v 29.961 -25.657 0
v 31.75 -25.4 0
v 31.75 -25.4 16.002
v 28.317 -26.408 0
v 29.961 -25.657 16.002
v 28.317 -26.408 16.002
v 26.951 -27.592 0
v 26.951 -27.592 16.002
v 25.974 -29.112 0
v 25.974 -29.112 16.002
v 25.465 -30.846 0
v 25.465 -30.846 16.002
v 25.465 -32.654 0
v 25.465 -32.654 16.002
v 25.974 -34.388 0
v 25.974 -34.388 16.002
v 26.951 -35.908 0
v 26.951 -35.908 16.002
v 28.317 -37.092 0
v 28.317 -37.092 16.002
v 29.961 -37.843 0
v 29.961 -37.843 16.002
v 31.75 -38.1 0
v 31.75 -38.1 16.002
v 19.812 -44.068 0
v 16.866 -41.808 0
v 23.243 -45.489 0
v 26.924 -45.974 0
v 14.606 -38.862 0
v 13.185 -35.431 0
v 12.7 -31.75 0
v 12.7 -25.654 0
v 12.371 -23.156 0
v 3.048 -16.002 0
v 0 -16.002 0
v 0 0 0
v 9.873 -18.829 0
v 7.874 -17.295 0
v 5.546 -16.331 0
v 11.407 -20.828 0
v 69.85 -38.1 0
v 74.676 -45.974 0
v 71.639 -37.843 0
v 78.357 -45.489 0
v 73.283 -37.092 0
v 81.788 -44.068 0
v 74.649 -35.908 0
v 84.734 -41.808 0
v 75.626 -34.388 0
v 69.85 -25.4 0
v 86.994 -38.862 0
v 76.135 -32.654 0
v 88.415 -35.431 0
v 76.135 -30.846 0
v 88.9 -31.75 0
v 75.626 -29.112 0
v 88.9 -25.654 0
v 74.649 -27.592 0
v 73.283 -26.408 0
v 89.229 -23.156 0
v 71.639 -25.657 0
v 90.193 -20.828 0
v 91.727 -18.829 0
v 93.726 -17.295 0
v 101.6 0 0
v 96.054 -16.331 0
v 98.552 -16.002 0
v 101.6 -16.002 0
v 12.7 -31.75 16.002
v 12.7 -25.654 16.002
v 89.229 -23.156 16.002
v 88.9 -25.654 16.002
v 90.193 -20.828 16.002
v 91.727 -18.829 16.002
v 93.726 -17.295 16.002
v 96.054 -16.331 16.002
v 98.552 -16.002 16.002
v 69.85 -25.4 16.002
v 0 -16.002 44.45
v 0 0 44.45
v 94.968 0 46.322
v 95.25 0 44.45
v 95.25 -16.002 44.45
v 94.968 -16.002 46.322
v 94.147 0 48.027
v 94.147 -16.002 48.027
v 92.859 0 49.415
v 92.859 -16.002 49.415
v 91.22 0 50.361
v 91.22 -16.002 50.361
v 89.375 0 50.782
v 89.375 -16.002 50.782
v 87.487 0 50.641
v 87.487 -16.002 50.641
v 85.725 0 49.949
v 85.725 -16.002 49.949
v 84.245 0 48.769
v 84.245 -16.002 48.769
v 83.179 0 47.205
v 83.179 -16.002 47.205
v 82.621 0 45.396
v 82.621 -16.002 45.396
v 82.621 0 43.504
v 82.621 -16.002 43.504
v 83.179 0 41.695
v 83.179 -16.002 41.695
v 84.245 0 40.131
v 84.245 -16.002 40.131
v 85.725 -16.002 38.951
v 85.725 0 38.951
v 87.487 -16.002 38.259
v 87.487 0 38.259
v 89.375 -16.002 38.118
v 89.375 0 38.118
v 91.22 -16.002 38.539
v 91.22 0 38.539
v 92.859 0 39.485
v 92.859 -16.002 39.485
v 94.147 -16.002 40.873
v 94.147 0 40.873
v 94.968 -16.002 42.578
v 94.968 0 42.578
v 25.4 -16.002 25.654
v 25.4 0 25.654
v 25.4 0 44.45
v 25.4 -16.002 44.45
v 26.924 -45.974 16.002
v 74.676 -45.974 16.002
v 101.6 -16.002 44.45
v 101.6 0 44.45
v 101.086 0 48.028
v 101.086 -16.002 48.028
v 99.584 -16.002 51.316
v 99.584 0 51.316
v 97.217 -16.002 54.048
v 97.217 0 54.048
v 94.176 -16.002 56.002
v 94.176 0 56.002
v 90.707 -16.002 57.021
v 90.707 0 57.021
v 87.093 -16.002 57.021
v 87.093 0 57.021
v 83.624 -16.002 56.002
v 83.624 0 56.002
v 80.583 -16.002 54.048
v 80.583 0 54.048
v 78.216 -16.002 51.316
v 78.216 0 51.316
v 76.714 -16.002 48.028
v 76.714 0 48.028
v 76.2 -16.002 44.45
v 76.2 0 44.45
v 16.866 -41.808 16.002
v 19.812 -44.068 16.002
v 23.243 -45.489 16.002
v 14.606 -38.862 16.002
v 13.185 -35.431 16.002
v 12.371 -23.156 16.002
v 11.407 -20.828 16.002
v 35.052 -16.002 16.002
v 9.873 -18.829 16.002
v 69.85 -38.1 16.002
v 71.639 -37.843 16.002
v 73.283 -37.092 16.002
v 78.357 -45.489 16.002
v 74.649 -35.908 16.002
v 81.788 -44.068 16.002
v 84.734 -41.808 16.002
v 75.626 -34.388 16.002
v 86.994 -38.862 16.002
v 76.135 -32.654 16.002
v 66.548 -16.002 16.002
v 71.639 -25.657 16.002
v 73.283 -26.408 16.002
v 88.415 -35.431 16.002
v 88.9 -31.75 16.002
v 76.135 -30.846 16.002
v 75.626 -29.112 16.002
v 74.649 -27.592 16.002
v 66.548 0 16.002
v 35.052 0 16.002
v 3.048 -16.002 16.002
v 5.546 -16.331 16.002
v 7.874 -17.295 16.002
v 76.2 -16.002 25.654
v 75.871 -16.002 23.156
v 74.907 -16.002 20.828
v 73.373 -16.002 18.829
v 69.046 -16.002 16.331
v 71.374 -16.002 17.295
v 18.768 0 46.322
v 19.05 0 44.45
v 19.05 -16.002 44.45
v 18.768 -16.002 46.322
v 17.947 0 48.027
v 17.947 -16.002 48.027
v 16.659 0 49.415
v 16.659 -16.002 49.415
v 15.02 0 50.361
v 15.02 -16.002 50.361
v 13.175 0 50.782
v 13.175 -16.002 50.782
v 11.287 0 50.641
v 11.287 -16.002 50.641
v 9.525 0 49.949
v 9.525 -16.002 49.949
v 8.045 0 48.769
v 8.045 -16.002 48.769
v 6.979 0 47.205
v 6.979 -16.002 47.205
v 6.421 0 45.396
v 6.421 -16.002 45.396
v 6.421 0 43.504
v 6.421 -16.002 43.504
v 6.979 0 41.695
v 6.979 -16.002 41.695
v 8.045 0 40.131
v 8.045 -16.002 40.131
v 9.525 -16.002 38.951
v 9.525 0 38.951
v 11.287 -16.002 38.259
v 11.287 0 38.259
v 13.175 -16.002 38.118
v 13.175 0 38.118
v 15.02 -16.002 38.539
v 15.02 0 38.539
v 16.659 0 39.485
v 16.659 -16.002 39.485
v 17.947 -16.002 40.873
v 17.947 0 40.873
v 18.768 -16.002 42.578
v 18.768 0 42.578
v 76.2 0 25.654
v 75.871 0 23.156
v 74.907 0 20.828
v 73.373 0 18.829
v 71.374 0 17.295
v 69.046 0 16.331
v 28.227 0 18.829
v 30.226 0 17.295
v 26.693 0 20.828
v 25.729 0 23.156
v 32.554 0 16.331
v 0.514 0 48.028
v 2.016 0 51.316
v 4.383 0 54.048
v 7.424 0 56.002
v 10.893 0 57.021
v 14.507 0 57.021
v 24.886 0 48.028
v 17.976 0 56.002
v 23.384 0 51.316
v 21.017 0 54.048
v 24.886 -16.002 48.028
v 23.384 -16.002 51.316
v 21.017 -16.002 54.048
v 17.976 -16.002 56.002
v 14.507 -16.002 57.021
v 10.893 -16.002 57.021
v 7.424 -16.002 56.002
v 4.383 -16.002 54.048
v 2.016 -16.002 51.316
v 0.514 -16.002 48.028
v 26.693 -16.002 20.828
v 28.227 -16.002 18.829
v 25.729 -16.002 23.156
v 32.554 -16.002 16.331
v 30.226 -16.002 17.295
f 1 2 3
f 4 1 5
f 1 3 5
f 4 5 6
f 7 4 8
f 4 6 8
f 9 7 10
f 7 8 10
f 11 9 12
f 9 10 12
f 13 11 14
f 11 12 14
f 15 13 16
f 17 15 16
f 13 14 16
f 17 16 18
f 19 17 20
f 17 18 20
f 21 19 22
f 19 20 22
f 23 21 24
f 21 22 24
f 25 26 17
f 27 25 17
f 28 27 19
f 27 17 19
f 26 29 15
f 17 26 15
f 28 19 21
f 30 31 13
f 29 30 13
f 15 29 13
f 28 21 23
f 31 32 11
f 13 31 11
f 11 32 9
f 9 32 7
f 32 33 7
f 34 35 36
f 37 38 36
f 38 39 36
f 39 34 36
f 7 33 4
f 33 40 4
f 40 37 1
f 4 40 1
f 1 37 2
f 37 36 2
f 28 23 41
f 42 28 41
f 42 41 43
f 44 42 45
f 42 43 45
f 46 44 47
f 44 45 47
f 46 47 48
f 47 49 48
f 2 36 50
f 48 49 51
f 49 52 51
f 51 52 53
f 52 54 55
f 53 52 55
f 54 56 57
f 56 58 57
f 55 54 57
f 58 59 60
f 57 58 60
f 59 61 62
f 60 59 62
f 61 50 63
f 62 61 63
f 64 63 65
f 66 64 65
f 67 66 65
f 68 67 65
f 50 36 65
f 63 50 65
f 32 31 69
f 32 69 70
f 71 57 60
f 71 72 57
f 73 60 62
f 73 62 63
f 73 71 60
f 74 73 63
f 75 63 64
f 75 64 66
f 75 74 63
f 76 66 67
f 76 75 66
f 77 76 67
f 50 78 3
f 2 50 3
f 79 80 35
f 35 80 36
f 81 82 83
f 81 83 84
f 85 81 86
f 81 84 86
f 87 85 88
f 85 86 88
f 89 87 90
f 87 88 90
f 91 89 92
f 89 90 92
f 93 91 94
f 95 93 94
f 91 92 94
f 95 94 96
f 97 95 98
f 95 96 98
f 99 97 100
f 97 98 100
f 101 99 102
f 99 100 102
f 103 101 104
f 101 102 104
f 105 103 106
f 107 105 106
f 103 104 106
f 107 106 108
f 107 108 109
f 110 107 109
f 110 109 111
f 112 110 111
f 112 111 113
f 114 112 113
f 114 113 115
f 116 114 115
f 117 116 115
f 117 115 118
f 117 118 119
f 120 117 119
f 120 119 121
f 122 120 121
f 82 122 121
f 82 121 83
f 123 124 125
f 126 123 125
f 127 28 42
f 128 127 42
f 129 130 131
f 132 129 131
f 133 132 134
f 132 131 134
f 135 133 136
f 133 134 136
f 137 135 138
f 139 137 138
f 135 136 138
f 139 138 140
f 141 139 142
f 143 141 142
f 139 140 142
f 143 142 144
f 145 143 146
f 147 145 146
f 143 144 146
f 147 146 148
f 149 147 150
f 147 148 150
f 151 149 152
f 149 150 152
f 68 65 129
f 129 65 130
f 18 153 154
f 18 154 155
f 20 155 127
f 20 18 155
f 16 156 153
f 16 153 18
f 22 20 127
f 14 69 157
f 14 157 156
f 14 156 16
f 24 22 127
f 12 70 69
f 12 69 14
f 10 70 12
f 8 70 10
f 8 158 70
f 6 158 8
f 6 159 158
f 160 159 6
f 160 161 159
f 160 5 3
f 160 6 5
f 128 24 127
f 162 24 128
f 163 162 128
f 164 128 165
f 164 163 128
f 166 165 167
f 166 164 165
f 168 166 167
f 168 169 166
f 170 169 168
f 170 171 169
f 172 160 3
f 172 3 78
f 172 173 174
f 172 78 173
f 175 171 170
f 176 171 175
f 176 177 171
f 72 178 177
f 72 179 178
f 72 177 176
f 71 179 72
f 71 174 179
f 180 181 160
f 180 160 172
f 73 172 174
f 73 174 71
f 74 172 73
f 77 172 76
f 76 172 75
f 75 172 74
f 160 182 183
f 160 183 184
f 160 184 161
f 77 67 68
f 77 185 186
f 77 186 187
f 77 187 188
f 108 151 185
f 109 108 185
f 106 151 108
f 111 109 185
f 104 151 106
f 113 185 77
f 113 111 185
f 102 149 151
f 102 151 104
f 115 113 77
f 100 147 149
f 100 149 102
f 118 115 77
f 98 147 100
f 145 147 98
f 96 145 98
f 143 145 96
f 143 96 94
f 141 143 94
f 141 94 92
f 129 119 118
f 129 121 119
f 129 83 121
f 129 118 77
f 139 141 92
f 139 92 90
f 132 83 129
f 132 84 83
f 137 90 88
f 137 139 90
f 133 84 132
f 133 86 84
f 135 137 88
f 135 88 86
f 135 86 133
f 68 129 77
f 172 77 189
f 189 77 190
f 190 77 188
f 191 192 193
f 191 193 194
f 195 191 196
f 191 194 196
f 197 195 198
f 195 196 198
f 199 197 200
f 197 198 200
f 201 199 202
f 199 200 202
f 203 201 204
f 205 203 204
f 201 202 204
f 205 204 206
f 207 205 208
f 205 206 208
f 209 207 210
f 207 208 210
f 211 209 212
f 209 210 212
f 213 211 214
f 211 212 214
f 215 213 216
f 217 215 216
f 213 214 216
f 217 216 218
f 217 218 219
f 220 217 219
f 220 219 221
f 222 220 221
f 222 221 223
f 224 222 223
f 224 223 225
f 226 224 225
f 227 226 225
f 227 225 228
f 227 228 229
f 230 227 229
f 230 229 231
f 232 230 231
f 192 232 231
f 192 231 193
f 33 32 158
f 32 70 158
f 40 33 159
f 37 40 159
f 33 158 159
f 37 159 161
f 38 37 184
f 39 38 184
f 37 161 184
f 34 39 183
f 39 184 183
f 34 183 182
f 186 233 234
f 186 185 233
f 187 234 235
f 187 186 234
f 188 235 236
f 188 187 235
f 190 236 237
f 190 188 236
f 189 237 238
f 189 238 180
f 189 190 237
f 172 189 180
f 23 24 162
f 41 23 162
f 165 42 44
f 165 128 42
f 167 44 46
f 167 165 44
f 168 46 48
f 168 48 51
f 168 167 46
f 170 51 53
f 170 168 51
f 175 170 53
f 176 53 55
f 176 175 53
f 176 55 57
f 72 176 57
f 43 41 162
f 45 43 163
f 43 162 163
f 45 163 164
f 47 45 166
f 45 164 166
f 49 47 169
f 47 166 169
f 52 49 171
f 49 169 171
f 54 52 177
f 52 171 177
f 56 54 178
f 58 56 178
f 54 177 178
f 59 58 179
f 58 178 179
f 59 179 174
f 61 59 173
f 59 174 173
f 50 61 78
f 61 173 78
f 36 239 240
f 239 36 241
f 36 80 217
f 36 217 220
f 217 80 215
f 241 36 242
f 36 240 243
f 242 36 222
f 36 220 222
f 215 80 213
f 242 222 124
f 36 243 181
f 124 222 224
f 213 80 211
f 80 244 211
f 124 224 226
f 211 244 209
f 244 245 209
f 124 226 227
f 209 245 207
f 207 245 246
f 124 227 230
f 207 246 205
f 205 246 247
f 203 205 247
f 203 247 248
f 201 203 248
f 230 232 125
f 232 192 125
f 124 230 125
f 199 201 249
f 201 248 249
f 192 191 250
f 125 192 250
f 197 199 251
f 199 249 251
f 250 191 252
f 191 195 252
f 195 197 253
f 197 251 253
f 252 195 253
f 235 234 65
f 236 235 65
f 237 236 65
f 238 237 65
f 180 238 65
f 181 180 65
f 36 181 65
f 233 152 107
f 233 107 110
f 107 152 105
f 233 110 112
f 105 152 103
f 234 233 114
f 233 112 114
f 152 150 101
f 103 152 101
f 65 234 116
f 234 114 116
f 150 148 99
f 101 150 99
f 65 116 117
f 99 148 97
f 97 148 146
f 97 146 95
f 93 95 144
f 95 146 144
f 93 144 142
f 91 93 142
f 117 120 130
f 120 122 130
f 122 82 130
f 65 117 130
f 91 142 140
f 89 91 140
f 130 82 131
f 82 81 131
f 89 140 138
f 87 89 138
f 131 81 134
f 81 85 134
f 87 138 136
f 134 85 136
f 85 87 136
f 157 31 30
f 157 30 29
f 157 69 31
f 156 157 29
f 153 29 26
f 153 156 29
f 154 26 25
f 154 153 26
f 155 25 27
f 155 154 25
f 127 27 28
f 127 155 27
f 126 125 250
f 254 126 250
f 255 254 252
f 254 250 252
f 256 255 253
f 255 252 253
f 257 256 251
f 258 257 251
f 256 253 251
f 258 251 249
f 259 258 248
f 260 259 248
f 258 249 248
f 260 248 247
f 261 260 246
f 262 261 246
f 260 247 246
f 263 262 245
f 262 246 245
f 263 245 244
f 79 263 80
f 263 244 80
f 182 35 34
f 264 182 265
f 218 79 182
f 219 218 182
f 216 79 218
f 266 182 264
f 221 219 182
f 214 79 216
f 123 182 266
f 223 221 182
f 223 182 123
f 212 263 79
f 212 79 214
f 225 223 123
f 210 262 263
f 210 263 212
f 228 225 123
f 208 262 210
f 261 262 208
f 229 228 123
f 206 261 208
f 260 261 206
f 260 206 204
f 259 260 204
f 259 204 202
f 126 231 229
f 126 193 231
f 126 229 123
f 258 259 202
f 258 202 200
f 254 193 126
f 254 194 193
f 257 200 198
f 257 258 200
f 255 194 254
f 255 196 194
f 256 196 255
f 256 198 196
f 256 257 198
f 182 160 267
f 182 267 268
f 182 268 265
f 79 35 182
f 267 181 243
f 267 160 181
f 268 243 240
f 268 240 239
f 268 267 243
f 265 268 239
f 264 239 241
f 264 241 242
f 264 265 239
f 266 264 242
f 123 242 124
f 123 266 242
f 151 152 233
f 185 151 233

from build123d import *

# Parameters (mm, degrees)
F1_DEPTH  = 16.002
F2_R      = 9.652
F3_W      = 76.2
F3_H      = 29.972
F4_DEPTH  = 16.002
F5_R      = 14.224
F6_R      = 9.652
F7_R      = 6.35
F8_DEPTH  = 16.003
F10_DEPTH = 16.003


with BuildPart() as f1:
    # F0 (on Front) → F1 (new body)
    with BuildSketch(Plane.XZ):
        with BuildLine():
            Line((0, 44.45), (0, 0))
            Line((0, 0), (101.6, 0))
            Line((101.6, 0), (101.6, 44.45))
            ThreePointArc((101.6, 44.45), (88.9, 57.15), (76.2, 44.45))
            Line((76.2, 44.45), (76.2, 16.002))
            Line((76.2, 16.002), (25.4, 16.002))
            Line((25.4, 16.002), (25.4, 44.45))
            ThreePointArc((25.4, 44.45), (12.7, 57.15), (0, 44.45))
        make_face()
    extrude(amount=F1_DEPTH)

    # F2
    f2_edges = [f1.edges().sort_by_distance(p)[0] for p in [
        (25.4, -8.001, 16.002),
        (76.2, -8.001, 16.002),
    ]]
    fillet(f2_edges, radius=F2_R)

    # F3 (on Top) → F4 (join)
    with BuildSketch(Plane.XY):
        with Locations((50.8, -30.988)):
            Rectangle(F3_W, F3_H)
    extrude(amount=F4_DEPTH)

    # F5
    f5_edges = [f1.edges().sort_by_distance(p)[0] for p in [
        (88.9, -45.974, 8.001),
        (12.7, -45.974, 8.001),
    ]]
    fillet(f5_edges, radius=F5_R)

    # F6
    f6_edges = [f1.edges().sort_by_distance(p)[0] for p in [
        (88.9, -16.002, 8.001),
        (12.7, -16.002, 8.001),
    ]]
    fillet(f6_edges, radius=F6_R)

    # F7 (on face) → F8 (cut, through all)
    with BuildSketch(Plane.XZ.offset(16.002)):
        with Locations((12.7, 44.45)):
            Circle(F7_R)
        with Locations((88.9, 44.45)):
            Circle(F7_R)
    extrude(amount=-F8_DEPTH, mode=Mode.SUBTRACT)

    # F9 (on face) → F10 (cut, through all)
    with BuildSketch(Plane.XY.offset(16.002)):
        with BuildLine():
            Line((69.85, -25.4), (31.75, -25.4))
            ThreePointArc((31.75, -25.4), (25.4, -31.75), (31.75, -38.1))
            Line((31.75, -38.1), (69.85, -38.1))
            ThreePointArc((69.85, -38.1), (76.2, -31.75), (69.85, -25.4))
        make_face()
    extrude(amount=-F10_DEPTH, mode=Mode.SUBTRACT)


solid = f1.part
